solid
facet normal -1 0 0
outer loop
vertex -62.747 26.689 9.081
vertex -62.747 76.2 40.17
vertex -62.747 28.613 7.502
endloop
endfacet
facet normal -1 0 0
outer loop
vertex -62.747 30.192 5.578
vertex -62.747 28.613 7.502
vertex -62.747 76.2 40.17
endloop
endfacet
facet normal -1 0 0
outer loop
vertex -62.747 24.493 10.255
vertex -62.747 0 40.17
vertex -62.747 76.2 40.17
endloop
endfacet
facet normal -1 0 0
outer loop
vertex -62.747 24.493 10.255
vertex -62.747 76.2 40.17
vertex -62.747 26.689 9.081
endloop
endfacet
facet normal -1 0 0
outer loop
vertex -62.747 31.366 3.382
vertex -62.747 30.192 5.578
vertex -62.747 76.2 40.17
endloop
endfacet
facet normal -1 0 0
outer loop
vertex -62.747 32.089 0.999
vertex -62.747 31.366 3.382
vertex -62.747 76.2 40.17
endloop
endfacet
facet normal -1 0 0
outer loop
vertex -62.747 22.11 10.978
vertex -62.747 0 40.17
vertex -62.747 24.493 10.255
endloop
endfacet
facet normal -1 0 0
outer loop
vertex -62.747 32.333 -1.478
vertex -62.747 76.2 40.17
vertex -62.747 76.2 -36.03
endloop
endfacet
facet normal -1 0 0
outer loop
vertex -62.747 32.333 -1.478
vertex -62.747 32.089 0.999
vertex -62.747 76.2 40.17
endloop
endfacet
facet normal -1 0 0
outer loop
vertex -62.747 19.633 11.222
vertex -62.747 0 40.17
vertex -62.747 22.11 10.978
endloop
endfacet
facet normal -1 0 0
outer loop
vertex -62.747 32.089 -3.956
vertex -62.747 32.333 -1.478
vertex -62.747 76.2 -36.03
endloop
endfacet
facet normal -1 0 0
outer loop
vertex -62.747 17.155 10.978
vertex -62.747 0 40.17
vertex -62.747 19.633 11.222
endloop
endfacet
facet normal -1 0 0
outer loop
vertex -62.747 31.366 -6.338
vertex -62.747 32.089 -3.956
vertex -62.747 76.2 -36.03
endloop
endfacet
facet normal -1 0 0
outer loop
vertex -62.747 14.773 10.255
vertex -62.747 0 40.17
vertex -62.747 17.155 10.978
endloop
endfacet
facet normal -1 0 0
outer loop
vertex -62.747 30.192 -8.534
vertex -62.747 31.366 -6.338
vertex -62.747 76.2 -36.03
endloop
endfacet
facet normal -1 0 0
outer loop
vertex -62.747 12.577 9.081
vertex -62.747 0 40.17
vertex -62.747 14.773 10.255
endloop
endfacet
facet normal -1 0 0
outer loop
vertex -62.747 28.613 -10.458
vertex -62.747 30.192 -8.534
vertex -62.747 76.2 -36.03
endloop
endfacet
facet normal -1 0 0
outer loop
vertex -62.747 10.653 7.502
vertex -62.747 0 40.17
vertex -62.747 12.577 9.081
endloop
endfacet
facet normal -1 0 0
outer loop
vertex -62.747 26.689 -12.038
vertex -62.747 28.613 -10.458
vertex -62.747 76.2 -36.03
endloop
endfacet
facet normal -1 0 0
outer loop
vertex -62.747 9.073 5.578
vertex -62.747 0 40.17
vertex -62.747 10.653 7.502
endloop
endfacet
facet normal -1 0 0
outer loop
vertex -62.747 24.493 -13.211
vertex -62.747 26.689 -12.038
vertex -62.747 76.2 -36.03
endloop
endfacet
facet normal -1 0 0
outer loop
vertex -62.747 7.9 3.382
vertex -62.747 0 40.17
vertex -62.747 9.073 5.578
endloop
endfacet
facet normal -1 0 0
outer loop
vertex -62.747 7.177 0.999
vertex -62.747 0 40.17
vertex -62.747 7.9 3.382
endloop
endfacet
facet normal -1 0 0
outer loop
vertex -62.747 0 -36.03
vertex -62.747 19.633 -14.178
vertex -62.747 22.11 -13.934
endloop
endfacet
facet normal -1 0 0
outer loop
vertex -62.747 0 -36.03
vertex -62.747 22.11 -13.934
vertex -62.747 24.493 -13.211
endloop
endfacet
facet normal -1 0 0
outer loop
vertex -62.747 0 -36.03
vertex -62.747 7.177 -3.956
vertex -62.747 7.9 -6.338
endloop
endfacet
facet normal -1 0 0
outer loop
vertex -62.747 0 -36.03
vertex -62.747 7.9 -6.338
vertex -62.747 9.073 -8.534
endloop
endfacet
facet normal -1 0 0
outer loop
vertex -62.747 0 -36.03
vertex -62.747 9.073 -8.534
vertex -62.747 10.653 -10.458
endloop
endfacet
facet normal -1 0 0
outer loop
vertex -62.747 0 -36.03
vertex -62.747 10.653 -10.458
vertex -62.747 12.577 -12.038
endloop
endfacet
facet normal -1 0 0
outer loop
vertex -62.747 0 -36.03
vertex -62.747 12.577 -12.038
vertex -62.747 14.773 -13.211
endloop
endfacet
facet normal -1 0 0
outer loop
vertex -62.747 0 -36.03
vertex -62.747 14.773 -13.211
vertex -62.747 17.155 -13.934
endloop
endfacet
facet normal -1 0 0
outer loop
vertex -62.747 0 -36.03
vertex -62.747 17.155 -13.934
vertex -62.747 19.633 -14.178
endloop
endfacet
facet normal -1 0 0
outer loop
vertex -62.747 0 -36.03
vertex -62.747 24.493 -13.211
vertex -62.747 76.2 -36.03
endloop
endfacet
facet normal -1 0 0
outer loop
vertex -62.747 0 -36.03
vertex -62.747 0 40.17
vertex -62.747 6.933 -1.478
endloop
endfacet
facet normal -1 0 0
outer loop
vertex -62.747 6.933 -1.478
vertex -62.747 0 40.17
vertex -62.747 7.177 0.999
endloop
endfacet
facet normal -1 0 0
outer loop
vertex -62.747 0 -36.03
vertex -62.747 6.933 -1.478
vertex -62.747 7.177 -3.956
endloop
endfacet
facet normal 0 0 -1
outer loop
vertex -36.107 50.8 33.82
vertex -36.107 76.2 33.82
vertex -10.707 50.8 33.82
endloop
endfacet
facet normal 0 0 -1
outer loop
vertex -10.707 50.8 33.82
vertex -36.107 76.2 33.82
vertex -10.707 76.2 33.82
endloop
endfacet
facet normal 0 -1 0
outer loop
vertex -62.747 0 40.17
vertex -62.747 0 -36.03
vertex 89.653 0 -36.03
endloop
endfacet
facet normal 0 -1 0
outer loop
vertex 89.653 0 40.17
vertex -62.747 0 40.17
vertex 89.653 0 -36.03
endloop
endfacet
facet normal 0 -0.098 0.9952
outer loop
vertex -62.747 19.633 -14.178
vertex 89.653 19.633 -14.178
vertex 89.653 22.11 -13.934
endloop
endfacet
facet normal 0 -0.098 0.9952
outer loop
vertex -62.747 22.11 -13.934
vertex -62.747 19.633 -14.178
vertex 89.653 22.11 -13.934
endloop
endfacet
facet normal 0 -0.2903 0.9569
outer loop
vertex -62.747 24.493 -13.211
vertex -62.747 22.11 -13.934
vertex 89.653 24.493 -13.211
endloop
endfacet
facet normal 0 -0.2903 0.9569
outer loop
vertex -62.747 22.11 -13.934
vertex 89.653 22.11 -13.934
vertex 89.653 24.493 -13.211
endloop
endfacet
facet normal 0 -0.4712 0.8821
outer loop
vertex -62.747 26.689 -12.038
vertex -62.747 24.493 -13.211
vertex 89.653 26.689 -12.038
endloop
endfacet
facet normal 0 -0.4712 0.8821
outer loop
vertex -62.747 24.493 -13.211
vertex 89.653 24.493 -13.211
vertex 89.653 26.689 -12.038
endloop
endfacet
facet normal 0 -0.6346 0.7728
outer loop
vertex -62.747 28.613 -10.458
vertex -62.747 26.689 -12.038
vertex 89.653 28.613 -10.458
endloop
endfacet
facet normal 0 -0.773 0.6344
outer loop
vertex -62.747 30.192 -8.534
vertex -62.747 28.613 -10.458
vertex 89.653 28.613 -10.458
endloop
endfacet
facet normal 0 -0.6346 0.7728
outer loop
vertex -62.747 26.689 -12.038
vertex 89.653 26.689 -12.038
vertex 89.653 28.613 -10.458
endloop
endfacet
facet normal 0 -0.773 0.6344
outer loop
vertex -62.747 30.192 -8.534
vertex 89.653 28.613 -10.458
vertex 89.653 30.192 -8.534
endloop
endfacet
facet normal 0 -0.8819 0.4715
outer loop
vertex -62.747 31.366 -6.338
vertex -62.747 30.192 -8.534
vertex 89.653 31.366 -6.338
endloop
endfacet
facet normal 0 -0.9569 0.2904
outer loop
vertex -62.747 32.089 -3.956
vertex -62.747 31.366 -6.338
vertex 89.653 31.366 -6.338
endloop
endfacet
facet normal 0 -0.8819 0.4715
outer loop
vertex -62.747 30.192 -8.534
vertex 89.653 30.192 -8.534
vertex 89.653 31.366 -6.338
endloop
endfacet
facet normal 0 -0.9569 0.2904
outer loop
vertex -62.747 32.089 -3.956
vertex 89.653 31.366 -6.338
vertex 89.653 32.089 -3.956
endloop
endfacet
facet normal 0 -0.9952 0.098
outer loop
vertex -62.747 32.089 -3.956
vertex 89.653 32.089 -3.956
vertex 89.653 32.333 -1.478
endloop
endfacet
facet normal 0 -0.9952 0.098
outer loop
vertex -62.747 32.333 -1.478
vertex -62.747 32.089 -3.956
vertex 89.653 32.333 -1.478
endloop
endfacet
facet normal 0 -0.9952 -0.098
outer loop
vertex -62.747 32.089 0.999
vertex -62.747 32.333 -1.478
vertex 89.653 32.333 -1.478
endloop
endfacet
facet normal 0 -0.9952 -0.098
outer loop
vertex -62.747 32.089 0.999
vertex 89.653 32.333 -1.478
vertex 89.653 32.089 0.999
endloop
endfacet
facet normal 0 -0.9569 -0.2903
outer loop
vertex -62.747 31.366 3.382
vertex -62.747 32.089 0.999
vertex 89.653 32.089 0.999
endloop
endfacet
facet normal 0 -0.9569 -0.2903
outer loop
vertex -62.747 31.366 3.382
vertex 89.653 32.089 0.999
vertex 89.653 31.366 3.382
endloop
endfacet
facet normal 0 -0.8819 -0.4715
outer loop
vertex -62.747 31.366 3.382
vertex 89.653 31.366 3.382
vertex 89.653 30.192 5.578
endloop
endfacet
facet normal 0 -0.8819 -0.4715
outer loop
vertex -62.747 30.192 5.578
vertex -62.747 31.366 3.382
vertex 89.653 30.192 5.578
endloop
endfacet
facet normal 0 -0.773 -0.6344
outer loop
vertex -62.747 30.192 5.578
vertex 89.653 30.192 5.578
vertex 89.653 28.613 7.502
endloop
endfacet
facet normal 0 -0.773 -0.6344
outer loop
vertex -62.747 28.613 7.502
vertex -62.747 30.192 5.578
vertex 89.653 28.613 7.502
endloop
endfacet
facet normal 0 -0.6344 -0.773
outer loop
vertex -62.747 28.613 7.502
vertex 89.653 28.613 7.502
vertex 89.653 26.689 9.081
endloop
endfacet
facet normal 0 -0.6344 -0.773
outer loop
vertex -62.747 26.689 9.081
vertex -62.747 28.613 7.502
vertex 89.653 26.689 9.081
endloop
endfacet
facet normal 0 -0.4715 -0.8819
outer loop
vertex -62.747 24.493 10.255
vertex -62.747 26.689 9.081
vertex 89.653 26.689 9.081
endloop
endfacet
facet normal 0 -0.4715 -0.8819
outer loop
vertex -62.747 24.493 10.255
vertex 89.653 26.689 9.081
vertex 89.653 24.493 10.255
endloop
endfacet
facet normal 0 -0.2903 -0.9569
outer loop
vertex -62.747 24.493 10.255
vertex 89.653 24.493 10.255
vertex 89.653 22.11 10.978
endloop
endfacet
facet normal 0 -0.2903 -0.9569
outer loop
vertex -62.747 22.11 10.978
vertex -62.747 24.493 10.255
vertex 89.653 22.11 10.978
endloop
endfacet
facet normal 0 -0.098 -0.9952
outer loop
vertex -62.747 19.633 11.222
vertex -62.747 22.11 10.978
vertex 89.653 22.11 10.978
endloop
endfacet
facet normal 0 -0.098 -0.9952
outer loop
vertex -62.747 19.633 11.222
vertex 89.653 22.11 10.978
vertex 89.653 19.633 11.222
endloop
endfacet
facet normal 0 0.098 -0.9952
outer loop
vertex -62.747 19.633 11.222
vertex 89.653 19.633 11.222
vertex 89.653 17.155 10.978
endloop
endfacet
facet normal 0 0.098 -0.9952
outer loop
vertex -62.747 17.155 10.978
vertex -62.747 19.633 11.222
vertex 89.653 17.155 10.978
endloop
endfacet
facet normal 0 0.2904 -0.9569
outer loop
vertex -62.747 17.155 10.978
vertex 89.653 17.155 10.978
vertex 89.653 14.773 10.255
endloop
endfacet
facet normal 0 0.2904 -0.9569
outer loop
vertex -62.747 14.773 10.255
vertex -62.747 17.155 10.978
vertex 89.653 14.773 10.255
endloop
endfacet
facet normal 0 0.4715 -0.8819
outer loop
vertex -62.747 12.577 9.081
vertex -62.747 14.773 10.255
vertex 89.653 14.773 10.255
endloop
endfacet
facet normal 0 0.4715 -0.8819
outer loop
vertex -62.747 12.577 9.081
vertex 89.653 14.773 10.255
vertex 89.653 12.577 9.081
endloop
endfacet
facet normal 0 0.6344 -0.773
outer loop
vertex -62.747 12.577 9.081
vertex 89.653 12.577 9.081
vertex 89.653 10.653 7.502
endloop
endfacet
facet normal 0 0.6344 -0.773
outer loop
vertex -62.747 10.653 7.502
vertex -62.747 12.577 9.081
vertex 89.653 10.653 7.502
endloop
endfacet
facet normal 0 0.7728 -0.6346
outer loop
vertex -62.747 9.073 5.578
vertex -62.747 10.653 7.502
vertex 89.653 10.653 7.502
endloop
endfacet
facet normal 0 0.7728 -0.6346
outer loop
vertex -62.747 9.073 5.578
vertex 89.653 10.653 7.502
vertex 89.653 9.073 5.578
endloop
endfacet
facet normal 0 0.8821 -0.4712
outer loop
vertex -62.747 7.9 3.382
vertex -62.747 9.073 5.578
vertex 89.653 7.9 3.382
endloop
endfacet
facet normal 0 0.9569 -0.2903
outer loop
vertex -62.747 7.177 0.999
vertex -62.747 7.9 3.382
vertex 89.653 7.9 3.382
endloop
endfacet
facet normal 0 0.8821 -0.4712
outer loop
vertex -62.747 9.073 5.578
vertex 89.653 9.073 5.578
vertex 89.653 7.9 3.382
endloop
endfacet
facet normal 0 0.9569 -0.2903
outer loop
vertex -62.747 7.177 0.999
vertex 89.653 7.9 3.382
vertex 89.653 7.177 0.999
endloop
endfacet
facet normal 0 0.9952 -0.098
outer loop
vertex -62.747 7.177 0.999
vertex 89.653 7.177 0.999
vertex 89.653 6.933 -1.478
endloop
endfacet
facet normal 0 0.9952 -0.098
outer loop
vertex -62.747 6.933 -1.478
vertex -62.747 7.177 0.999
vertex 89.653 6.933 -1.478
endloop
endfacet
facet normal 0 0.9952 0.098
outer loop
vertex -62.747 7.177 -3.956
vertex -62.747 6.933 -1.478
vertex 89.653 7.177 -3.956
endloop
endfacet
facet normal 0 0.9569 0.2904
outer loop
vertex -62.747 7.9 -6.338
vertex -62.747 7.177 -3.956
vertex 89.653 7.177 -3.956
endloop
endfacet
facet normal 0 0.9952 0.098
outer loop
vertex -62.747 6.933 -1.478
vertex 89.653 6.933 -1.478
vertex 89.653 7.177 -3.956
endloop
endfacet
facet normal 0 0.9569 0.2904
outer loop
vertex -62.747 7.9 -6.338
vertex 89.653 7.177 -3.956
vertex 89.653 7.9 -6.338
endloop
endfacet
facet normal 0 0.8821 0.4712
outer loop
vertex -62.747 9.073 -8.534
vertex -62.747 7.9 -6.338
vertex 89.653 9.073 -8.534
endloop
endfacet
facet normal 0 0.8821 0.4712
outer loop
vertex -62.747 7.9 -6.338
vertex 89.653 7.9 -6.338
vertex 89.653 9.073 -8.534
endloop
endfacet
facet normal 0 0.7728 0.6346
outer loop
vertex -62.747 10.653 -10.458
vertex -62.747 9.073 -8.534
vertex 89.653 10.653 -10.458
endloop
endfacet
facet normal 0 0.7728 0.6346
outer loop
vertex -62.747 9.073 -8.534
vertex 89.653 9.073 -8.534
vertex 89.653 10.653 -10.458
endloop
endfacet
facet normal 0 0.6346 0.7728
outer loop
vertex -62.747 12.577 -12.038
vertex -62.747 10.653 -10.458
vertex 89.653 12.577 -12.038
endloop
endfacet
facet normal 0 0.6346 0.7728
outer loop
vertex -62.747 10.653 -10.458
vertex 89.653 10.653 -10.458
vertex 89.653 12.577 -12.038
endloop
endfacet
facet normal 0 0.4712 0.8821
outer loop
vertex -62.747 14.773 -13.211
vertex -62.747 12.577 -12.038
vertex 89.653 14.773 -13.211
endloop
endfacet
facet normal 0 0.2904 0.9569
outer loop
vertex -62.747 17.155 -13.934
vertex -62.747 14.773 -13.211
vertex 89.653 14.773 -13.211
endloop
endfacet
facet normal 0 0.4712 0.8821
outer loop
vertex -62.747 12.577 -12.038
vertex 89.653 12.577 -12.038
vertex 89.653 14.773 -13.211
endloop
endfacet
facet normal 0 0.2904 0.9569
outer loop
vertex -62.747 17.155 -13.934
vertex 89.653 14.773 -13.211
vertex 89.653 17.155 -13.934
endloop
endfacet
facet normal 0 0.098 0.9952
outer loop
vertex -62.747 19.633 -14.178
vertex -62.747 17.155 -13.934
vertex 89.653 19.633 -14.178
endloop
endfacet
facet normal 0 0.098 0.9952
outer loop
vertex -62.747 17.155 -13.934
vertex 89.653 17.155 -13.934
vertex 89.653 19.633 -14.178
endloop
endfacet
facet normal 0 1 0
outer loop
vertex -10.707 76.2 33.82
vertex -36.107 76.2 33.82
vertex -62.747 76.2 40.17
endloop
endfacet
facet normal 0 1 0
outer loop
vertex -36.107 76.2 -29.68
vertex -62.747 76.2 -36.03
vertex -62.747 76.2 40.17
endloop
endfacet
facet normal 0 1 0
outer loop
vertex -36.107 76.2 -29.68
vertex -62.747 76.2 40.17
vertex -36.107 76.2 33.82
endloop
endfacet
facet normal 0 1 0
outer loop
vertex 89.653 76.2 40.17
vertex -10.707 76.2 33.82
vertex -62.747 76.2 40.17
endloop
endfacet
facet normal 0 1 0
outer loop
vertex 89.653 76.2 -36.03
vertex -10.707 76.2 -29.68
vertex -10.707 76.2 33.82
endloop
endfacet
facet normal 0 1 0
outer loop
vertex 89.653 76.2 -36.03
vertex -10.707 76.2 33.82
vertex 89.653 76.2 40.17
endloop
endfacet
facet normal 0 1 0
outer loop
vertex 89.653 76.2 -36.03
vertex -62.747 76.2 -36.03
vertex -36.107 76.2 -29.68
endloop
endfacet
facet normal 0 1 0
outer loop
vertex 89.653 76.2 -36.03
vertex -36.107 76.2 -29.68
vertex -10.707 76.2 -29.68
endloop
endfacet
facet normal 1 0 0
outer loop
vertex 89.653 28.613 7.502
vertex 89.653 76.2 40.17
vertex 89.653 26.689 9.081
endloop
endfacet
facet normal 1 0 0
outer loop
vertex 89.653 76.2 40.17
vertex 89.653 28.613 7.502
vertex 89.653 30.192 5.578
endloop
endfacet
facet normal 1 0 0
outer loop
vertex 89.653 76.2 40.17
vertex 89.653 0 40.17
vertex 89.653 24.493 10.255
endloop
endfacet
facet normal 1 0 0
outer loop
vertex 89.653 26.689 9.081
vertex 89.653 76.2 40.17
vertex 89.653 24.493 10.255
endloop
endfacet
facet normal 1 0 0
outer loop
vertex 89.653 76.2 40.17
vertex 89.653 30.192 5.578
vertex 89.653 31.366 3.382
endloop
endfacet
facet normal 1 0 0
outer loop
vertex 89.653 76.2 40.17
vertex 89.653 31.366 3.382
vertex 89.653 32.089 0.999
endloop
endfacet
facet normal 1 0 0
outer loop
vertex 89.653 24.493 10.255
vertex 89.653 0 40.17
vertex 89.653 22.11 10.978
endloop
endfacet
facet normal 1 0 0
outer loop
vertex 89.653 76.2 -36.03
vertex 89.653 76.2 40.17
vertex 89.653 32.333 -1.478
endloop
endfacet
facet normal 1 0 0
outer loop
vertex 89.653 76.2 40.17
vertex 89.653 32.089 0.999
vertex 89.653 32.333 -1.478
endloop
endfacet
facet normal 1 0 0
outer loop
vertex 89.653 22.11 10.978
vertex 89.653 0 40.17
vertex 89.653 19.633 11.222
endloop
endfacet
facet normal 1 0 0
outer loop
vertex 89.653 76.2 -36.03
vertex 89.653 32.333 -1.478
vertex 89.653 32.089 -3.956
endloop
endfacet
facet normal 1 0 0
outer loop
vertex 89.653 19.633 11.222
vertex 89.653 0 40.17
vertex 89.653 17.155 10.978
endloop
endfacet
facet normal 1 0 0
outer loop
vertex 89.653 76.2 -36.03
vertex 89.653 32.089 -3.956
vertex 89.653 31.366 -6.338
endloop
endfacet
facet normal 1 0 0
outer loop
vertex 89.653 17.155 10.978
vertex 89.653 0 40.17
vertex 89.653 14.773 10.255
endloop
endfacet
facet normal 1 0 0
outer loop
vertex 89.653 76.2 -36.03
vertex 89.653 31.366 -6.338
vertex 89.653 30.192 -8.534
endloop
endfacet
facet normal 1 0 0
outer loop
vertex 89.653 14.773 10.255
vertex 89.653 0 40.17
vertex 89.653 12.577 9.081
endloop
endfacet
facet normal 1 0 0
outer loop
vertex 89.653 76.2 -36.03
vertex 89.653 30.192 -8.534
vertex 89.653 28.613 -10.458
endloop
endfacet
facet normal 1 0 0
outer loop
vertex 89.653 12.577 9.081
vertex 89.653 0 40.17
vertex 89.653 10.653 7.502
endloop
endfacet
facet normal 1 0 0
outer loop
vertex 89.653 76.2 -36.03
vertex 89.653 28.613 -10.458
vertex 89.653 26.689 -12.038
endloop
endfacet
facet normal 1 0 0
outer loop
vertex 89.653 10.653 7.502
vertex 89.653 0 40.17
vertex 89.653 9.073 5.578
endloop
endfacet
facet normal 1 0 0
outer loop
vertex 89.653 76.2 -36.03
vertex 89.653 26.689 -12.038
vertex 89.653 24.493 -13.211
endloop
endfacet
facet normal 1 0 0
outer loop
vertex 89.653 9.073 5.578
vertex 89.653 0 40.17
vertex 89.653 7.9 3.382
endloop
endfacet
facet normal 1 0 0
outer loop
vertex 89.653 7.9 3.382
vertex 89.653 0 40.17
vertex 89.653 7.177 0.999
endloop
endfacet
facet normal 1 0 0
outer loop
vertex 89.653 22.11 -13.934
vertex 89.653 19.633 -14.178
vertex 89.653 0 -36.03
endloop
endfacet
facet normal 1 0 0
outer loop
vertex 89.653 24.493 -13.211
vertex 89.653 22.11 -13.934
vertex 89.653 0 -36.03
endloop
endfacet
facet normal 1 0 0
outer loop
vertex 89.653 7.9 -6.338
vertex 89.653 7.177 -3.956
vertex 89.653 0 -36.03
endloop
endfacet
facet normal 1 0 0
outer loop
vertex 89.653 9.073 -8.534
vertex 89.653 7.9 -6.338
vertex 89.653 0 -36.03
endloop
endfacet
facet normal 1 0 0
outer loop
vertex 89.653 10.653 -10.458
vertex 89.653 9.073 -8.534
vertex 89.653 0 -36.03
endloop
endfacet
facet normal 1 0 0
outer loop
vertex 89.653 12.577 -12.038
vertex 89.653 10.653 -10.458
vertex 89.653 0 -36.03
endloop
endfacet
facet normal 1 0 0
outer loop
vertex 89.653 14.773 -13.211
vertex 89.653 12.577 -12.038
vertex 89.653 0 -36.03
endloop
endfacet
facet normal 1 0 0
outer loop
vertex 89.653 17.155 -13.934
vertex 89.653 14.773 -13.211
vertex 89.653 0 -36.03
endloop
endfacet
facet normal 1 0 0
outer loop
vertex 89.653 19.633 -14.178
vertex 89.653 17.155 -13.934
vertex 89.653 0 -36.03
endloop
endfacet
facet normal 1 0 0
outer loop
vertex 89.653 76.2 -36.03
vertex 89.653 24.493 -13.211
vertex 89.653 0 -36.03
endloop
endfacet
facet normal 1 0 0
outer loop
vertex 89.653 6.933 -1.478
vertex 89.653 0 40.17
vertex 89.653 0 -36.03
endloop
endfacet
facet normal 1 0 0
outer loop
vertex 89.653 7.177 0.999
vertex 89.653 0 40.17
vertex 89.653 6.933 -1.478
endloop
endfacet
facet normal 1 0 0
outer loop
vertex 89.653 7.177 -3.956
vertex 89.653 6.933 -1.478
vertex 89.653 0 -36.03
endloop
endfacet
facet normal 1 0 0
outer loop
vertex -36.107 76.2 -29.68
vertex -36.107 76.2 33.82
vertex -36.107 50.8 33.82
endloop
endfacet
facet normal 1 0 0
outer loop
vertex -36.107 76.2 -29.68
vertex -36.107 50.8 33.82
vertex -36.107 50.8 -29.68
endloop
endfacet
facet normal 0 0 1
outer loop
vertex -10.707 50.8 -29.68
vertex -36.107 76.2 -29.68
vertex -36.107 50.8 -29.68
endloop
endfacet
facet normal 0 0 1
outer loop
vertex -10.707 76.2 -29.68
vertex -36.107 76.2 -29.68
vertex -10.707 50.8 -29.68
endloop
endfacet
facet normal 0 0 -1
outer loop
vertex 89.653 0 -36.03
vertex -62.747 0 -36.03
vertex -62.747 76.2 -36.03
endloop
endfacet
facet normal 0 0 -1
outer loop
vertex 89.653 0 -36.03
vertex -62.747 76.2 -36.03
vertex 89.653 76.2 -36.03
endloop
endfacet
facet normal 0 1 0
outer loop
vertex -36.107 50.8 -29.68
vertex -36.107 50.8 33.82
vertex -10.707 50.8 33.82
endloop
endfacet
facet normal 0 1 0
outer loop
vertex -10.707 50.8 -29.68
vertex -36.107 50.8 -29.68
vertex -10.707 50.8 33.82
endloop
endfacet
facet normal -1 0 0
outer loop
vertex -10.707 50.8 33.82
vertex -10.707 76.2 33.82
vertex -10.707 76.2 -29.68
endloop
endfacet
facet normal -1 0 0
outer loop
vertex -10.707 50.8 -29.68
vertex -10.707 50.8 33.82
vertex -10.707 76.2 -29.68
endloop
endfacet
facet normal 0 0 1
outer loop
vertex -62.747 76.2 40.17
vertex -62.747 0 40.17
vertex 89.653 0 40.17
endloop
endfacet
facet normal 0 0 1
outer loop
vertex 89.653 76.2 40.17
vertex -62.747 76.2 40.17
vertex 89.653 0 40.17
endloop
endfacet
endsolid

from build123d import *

# Parameters (mm, degrees)
SKETCH1_W           = 152.4
SKETCH1_H           = 76.2
BOSS_EXTRUDE1_DEPTH = 76.2
SKETCH2_R           = 12.7
CUT_EXTRUDE1_DEPTH  = 176.059416041
SKETCH3_W           = 25.4
SKETCH3_H           = 63.5
CUT_EXTRUDE2_DEPTH  = 25.4


with BuildPart() as part:
    # Sketch1 → Boss-Extrude1 (new body)
    with BuildSketch(Plane(origin=(0, 0, 0), x_dir=(1, 0, 0), z_dir=(0, 1, 0))):
        with Locations((13.452592593, -2.06962963)):
            Rectangle(SKETCH1_W, SKETCH1_H)
    extrude(amount=BOSS_EXTRUDE1_DEPTH)

    # Sketch2 → Cut-Extrude1 (cut, through all)
    with BuildSketch(Plane(origin=(89.652592593, 0, 0), x_dir=(0, 0, -1), z_dir=(1, 0, 0))):
        with Locations((1.478173536, 19.632815924)):
            Circle(SKETCH2_R)
    extrude(amount=-CUT_EXTRUDE1_DEPTH, mode=Mode.SUBTRACT)

    # Sketch3 → Cut-Extrude2 (cut)
    with BuildSketch(Plane(origin=(0, 76.2, 0), x_dir=(1, 0, 0), z_dir=(0, 1, 0))):
        with Locations((-23.407128425, -2.06962963)):
            Rectangle(SKETCH3_W, SKETCH3_H)
    extrude(amount=-CUT_EXTRUDE2_DEPTH, mode=Mode.SUBTRACT)


solid = part.part
